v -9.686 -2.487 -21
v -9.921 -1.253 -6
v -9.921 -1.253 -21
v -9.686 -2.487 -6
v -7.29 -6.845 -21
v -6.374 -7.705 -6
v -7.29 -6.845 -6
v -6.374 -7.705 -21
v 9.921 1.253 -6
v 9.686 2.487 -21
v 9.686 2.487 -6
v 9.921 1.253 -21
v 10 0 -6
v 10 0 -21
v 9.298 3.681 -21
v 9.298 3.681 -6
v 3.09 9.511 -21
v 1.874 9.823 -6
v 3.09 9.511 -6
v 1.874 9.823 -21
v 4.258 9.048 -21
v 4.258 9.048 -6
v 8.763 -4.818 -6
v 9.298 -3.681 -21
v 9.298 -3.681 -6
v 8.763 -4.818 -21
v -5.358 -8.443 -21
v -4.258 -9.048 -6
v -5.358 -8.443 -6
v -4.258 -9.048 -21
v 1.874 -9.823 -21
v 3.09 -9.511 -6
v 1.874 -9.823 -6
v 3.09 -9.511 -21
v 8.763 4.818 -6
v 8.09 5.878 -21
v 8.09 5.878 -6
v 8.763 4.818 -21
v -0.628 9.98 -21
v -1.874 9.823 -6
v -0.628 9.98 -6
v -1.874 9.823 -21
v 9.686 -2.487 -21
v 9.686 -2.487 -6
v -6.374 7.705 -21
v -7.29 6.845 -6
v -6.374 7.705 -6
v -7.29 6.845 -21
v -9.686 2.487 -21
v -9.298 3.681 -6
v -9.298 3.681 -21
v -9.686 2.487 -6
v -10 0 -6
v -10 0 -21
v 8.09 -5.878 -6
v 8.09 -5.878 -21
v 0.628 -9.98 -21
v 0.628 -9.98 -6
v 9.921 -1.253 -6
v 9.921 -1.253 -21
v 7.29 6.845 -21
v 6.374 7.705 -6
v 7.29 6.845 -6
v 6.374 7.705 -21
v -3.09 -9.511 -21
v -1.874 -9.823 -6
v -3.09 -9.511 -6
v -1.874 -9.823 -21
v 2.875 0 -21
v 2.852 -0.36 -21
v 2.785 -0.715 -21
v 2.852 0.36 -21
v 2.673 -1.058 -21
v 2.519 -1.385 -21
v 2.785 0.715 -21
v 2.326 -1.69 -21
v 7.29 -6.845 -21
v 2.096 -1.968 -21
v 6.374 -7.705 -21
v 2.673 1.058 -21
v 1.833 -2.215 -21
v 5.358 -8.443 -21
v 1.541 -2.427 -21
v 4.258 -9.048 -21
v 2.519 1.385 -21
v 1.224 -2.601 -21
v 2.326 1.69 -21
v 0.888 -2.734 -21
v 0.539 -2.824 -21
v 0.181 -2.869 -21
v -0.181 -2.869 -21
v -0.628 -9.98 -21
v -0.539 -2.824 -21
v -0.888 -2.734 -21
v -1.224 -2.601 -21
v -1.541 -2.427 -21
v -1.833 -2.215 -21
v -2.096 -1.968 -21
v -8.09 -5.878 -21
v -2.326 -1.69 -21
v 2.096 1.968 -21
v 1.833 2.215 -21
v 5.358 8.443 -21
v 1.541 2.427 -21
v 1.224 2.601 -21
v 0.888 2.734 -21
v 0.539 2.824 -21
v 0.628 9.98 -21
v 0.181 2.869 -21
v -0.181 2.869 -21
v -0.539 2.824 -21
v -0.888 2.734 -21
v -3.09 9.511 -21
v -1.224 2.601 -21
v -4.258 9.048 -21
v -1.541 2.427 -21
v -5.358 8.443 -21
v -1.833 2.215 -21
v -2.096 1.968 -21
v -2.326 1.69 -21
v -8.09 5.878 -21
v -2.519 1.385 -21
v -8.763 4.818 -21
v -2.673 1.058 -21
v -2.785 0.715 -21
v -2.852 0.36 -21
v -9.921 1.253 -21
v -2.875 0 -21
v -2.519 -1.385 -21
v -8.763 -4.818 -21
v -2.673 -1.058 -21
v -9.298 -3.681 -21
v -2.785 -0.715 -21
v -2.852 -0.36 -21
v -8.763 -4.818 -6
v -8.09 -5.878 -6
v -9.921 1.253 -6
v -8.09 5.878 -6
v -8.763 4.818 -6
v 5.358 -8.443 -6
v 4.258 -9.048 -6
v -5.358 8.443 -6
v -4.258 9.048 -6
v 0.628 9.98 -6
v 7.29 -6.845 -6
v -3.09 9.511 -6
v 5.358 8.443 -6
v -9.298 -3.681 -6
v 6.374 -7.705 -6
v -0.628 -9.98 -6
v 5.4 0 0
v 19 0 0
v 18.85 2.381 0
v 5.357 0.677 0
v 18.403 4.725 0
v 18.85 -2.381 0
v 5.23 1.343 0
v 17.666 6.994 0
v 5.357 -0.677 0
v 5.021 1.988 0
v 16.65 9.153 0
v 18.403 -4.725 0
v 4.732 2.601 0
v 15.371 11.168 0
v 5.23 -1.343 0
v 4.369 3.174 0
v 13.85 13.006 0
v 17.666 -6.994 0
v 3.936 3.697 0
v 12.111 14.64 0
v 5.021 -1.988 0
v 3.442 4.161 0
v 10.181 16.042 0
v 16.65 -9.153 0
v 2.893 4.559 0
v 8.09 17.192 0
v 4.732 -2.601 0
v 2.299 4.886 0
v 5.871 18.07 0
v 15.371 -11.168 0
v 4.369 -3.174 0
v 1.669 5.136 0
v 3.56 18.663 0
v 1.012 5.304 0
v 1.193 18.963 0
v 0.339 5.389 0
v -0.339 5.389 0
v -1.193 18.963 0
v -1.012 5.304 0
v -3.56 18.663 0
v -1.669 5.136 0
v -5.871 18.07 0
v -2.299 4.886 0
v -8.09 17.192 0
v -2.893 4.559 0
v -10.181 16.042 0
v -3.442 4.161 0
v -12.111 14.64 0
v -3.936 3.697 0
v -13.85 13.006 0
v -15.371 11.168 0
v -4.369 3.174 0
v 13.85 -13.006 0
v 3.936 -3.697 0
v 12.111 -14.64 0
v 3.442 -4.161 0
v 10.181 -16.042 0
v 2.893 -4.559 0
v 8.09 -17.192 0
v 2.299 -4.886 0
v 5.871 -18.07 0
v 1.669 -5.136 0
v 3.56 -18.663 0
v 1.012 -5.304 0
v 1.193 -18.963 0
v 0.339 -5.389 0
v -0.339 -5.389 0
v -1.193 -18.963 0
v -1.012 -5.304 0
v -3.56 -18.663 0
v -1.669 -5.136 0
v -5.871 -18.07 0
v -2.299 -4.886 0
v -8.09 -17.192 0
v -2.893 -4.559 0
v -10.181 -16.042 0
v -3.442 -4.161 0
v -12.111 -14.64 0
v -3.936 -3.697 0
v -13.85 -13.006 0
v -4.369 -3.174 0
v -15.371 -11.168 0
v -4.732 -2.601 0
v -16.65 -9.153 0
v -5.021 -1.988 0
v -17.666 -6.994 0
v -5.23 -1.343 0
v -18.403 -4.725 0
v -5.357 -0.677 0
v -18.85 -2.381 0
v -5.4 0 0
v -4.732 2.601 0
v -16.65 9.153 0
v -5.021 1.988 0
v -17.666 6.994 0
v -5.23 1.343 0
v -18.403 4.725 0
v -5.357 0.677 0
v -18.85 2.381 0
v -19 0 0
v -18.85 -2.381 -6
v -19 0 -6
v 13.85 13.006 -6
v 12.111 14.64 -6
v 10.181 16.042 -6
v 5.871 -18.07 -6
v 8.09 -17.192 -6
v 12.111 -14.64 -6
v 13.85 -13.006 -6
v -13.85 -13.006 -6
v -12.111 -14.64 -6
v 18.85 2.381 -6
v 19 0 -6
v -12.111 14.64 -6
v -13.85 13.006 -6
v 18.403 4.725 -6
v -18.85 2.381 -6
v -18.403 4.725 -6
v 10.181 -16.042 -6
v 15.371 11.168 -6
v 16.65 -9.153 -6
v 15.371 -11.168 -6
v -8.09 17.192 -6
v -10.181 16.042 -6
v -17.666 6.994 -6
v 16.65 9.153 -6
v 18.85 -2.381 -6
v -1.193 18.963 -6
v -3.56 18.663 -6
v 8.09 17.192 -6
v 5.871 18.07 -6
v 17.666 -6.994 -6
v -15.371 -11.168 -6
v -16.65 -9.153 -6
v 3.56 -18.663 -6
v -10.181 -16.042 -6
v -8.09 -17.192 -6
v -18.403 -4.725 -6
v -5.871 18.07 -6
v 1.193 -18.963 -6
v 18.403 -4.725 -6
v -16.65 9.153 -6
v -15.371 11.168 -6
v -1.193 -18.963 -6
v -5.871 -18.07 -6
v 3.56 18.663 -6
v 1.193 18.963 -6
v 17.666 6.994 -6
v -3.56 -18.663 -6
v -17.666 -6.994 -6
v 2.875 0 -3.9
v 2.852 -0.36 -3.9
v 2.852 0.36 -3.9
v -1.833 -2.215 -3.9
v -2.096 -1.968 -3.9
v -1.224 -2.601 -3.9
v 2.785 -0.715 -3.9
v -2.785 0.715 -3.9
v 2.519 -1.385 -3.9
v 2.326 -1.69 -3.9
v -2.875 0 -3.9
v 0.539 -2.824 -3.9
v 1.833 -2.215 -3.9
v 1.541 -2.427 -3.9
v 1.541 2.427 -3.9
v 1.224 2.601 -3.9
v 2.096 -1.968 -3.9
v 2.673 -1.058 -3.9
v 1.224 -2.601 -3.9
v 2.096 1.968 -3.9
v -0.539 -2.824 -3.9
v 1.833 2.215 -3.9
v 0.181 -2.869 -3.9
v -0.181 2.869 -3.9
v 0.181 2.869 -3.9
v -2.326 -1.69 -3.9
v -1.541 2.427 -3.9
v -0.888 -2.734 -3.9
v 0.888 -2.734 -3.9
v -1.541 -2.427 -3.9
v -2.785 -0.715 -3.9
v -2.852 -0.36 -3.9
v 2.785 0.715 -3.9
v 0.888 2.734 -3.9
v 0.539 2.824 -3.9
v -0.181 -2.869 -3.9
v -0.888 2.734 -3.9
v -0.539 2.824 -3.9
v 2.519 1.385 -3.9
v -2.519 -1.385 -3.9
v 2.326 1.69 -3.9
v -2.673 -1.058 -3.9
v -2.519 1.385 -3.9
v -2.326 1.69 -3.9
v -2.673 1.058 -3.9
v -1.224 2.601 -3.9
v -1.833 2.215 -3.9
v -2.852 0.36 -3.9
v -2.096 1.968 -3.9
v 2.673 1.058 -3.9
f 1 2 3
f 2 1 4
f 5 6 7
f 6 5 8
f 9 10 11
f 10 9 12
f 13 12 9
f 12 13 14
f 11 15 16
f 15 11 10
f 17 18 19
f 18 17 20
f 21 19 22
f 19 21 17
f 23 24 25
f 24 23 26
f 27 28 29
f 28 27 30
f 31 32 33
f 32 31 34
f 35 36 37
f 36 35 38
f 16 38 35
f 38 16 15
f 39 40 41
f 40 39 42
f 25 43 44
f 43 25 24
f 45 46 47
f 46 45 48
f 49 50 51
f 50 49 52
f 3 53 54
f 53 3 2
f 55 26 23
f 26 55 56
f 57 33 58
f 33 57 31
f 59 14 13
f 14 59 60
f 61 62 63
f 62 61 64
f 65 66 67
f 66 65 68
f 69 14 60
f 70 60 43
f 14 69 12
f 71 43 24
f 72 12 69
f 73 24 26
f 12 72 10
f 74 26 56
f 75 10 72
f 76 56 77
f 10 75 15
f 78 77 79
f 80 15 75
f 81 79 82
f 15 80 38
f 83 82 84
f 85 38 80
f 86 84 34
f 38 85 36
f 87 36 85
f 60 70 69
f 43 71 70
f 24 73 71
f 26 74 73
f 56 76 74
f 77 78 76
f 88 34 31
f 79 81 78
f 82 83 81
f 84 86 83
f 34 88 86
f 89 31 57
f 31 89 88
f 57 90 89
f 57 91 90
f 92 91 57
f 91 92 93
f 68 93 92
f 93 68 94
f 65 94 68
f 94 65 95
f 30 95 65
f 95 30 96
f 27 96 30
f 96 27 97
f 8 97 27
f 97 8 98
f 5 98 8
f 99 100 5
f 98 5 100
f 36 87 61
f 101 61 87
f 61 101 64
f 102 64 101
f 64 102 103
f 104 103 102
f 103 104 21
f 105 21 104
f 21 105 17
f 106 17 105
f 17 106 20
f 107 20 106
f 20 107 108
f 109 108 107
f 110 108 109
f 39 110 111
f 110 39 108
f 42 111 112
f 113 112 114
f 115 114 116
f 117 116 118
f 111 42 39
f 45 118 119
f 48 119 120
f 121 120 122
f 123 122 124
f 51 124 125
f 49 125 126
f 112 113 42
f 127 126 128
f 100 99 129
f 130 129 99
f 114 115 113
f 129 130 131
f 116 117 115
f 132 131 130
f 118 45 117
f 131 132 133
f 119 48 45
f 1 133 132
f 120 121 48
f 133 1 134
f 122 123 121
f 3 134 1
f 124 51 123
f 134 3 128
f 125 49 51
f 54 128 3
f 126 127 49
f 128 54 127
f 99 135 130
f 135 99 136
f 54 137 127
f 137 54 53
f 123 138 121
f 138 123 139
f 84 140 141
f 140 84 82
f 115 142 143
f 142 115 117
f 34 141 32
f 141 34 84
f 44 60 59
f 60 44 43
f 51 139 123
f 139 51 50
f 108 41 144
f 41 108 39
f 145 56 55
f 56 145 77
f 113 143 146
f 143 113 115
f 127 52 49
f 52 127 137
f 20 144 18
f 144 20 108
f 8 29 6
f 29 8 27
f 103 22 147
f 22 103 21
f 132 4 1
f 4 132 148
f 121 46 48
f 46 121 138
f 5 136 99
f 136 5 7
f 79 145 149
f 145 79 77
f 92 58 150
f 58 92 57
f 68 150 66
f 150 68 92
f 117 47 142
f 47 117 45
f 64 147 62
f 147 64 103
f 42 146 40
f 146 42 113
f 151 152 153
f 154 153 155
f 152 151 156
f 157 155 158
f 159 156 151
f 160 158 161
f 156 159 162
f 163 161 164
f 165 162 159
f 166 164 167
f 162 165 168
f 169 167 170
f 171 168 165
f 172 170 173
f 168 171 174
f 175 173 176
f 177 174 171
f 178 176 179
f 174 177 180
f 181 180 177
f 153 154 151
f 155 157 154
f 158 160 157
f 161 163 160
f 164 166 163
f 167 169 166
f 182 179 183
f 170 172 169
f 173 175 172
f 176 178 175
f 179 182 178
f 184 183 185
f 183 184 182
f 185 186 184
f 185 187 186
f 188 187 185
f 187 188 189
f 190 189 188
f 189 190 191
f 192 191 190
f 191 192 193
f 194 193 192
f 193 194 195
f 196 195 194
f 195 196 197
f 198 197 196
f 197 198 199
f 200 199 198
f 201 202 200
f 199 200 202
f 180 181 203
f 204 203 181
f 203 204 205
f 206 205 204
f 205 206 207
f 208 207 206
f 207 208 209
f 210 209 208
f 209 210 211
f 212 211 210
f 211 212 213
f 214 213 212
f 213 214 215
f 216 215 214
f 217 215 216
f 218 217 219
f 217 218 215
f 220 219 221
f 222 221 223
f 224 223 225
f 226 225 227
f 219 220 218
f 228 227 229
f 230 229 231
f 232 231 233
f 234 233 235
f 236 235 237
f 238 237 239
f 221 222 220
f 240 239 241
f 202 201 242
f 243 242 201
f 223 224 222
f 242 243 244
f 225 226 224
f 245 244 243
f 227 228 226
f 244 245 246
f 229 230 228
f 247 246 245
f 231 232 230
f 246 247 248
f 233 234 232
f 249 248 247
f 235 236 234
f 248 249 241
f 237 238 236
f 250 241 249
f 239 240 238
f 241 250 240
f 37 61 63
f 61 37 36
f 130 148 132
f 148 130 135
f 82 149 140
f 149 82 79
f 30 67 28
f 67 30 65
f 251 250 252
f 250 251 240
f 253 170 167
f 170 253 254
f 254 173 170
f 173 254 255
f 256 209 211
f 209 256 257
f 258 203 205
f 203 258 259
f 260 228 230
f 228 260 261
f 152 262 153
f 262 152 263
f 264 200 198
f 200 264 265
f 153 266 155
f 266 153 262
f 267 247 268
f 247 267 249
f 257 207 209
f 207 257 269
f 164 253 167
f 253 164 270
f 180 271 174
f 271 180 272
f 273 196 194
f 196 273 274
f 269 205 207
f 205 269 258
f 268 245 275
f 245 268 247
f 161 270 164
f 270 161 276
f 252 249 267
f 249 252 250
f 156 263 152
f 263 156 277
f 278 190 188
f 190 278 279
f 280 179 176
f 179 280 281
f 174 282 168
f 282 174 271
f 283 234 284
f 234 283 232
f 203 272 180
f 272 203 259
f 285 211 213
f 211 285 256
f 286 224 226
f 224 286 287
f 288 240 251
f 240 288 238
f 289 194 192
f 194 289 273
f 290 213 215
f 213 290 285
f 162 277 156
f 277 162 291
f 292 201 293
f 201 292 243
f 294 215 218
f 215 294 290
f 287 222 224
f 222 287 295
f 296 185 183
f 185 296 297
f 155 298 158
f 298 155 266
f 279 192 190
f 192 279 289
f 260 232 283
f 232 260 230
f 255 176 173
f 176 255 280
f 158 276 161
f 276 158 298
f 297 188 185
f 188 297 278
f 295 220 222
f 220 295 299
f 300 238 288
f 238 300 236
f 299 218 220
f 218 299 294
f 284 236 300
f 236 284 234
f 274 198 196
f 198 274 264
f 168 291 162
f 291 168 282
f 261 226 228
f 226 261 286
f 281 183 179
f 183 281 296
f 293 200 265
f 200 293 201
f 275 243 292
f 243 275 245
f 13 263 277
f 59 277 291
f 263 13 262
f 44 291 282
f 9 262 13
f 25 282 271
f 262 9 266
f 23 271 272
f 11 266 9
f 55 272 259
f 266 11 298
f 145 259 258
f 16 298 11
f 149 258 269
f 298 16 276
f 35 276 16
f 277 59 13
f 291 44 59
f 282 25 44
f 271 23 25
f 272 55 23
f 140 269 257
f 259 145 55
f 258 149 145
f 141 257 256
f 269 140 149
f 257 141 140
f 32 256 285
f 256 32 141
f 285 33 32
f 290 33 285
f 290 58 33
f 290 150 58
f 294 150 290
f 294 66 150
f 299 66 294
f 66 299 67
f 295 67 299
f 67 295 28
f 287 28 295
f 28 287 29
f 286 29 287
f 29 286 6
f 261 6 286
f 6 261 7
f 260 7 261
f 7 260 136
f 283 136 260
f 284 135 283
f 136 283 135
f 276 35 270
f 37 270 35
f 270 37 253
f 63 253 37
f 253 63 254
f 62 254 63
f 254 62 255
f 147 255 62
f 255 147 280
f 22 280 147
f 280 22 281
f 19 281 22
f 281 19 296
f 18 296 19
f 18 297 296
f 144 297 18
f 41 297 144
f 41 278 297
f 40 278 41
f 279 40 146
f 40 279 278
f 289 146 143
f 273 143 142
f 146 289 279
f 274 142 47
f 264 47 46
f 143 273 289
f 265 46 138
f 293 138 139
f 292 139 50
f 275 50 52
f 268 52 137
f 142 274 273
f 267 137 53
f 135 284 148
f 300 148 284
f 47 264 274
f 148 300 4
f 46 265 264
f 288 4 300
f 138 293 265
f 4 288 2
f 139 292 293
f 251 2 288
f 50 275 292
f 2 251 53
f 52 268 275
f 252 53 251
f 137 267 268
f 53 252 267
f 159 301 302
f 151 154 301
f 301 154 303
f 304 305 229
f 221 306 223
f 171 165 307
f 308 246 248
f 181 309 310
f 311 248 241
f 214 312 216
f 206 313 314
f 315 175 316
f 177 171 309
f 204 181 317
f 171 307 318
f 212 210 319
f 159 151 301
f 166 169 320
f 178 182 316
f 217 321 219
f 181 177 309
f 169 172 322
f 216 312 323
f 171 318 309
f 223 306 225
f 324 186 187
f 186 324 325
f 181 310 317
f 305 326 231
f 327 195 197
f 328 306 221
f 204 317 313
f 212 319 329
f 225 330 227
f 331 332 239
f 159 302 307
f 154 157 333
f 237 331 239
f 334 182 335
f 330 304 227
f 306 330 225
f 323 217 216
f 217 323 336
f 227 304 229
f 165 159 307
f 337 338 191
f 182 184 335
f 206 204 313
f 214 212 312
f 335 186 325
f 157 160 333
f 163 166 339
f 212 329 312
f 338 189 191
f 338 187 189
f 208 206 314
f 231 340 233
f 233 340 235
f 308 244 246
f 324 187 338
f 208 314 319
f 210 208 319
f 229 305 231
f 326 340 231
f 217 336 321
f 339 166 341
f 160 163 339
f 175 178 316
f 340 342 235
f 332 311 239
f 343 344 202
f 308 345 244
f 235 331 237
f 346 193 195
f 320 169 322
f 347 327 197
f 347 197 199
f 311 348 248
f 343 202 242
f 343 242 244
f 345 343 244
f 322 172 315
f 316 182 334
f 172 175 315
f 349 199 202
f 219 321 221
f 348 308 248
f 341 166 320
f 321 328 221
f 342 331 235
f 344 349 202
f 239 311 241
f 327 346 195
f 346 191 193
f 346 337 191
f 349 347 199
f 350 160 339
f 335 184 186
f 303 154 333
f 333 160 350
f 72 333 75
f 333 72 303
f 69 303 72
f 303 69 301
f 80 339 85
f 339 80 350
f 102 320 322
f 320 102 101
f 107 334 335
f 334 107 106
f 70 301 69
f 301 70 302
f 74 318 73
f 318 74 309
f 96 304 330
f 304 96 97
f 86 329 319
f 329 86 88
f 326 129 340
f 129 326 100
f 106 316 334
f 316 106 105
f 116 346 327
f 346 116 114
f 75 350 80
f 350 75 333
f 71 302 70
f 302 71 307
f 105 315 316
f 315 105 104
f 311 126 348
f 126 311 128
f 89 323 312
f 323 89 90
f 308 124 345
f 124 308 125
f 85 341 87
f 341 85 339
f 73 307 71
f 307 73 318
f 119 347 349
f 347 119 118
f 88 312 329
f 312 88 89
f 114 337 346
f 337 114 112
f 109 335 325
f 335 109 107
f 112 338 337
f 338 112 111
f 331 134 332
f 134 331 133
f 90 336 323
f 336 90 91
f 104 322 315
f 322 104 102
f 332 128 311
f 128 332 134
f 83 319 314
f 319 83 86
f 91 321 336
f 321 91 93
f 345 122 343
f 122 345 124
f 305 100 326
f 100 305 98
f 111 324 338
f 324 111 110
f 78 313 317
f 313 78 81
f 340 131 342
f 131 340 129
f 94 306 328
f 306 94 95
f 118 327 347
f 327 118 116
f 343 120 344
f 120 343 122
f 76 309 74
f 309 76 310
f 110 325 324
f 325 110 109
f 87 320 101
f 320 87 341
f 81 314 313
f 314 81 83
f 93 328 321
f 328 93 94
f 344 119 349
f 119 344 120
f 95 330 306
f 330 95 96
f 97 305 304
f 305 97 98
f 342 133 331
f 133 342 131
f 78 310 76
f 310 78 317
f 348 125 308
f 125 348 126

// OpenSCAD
$fn = 50;


difference() {
	union() {
		translate(v = [0, 0, -21.0000000000]) {
			cylinder(h = 21, r = 10.0000000000);
		}
		translate(v = [0, 0, -6.0000000000]) {
			cylinder(h = 6, r = 19.0000000000);
		}
	}
	union() {
		translate(v = [0, 0, 0]) {
			rotate(a = [0, 0, 0]) {
				difference() {
					union() {
						#translate(v = [0, 0, -21.0000000000]) {
							cylinder(h = 21, r = 2.6000000000);
						}
						#translate(v = [0, 0, -3.9000000000]) {
							cylinder(h = 3.9000000000, r1 = 2.8750000000, r2 = 5.4000000000);
						}
						#translate(v = [0, 0, -21.0000000000]) {
							cylinder(h = 21, r = 2.8750000000);
						}
						#translate(v = [0, 0, -21.0000000000]) {
							cylinder(h = 21, r = 2.6000000000);
						}
					}
					union();
				}
			}
		}
	}
}
